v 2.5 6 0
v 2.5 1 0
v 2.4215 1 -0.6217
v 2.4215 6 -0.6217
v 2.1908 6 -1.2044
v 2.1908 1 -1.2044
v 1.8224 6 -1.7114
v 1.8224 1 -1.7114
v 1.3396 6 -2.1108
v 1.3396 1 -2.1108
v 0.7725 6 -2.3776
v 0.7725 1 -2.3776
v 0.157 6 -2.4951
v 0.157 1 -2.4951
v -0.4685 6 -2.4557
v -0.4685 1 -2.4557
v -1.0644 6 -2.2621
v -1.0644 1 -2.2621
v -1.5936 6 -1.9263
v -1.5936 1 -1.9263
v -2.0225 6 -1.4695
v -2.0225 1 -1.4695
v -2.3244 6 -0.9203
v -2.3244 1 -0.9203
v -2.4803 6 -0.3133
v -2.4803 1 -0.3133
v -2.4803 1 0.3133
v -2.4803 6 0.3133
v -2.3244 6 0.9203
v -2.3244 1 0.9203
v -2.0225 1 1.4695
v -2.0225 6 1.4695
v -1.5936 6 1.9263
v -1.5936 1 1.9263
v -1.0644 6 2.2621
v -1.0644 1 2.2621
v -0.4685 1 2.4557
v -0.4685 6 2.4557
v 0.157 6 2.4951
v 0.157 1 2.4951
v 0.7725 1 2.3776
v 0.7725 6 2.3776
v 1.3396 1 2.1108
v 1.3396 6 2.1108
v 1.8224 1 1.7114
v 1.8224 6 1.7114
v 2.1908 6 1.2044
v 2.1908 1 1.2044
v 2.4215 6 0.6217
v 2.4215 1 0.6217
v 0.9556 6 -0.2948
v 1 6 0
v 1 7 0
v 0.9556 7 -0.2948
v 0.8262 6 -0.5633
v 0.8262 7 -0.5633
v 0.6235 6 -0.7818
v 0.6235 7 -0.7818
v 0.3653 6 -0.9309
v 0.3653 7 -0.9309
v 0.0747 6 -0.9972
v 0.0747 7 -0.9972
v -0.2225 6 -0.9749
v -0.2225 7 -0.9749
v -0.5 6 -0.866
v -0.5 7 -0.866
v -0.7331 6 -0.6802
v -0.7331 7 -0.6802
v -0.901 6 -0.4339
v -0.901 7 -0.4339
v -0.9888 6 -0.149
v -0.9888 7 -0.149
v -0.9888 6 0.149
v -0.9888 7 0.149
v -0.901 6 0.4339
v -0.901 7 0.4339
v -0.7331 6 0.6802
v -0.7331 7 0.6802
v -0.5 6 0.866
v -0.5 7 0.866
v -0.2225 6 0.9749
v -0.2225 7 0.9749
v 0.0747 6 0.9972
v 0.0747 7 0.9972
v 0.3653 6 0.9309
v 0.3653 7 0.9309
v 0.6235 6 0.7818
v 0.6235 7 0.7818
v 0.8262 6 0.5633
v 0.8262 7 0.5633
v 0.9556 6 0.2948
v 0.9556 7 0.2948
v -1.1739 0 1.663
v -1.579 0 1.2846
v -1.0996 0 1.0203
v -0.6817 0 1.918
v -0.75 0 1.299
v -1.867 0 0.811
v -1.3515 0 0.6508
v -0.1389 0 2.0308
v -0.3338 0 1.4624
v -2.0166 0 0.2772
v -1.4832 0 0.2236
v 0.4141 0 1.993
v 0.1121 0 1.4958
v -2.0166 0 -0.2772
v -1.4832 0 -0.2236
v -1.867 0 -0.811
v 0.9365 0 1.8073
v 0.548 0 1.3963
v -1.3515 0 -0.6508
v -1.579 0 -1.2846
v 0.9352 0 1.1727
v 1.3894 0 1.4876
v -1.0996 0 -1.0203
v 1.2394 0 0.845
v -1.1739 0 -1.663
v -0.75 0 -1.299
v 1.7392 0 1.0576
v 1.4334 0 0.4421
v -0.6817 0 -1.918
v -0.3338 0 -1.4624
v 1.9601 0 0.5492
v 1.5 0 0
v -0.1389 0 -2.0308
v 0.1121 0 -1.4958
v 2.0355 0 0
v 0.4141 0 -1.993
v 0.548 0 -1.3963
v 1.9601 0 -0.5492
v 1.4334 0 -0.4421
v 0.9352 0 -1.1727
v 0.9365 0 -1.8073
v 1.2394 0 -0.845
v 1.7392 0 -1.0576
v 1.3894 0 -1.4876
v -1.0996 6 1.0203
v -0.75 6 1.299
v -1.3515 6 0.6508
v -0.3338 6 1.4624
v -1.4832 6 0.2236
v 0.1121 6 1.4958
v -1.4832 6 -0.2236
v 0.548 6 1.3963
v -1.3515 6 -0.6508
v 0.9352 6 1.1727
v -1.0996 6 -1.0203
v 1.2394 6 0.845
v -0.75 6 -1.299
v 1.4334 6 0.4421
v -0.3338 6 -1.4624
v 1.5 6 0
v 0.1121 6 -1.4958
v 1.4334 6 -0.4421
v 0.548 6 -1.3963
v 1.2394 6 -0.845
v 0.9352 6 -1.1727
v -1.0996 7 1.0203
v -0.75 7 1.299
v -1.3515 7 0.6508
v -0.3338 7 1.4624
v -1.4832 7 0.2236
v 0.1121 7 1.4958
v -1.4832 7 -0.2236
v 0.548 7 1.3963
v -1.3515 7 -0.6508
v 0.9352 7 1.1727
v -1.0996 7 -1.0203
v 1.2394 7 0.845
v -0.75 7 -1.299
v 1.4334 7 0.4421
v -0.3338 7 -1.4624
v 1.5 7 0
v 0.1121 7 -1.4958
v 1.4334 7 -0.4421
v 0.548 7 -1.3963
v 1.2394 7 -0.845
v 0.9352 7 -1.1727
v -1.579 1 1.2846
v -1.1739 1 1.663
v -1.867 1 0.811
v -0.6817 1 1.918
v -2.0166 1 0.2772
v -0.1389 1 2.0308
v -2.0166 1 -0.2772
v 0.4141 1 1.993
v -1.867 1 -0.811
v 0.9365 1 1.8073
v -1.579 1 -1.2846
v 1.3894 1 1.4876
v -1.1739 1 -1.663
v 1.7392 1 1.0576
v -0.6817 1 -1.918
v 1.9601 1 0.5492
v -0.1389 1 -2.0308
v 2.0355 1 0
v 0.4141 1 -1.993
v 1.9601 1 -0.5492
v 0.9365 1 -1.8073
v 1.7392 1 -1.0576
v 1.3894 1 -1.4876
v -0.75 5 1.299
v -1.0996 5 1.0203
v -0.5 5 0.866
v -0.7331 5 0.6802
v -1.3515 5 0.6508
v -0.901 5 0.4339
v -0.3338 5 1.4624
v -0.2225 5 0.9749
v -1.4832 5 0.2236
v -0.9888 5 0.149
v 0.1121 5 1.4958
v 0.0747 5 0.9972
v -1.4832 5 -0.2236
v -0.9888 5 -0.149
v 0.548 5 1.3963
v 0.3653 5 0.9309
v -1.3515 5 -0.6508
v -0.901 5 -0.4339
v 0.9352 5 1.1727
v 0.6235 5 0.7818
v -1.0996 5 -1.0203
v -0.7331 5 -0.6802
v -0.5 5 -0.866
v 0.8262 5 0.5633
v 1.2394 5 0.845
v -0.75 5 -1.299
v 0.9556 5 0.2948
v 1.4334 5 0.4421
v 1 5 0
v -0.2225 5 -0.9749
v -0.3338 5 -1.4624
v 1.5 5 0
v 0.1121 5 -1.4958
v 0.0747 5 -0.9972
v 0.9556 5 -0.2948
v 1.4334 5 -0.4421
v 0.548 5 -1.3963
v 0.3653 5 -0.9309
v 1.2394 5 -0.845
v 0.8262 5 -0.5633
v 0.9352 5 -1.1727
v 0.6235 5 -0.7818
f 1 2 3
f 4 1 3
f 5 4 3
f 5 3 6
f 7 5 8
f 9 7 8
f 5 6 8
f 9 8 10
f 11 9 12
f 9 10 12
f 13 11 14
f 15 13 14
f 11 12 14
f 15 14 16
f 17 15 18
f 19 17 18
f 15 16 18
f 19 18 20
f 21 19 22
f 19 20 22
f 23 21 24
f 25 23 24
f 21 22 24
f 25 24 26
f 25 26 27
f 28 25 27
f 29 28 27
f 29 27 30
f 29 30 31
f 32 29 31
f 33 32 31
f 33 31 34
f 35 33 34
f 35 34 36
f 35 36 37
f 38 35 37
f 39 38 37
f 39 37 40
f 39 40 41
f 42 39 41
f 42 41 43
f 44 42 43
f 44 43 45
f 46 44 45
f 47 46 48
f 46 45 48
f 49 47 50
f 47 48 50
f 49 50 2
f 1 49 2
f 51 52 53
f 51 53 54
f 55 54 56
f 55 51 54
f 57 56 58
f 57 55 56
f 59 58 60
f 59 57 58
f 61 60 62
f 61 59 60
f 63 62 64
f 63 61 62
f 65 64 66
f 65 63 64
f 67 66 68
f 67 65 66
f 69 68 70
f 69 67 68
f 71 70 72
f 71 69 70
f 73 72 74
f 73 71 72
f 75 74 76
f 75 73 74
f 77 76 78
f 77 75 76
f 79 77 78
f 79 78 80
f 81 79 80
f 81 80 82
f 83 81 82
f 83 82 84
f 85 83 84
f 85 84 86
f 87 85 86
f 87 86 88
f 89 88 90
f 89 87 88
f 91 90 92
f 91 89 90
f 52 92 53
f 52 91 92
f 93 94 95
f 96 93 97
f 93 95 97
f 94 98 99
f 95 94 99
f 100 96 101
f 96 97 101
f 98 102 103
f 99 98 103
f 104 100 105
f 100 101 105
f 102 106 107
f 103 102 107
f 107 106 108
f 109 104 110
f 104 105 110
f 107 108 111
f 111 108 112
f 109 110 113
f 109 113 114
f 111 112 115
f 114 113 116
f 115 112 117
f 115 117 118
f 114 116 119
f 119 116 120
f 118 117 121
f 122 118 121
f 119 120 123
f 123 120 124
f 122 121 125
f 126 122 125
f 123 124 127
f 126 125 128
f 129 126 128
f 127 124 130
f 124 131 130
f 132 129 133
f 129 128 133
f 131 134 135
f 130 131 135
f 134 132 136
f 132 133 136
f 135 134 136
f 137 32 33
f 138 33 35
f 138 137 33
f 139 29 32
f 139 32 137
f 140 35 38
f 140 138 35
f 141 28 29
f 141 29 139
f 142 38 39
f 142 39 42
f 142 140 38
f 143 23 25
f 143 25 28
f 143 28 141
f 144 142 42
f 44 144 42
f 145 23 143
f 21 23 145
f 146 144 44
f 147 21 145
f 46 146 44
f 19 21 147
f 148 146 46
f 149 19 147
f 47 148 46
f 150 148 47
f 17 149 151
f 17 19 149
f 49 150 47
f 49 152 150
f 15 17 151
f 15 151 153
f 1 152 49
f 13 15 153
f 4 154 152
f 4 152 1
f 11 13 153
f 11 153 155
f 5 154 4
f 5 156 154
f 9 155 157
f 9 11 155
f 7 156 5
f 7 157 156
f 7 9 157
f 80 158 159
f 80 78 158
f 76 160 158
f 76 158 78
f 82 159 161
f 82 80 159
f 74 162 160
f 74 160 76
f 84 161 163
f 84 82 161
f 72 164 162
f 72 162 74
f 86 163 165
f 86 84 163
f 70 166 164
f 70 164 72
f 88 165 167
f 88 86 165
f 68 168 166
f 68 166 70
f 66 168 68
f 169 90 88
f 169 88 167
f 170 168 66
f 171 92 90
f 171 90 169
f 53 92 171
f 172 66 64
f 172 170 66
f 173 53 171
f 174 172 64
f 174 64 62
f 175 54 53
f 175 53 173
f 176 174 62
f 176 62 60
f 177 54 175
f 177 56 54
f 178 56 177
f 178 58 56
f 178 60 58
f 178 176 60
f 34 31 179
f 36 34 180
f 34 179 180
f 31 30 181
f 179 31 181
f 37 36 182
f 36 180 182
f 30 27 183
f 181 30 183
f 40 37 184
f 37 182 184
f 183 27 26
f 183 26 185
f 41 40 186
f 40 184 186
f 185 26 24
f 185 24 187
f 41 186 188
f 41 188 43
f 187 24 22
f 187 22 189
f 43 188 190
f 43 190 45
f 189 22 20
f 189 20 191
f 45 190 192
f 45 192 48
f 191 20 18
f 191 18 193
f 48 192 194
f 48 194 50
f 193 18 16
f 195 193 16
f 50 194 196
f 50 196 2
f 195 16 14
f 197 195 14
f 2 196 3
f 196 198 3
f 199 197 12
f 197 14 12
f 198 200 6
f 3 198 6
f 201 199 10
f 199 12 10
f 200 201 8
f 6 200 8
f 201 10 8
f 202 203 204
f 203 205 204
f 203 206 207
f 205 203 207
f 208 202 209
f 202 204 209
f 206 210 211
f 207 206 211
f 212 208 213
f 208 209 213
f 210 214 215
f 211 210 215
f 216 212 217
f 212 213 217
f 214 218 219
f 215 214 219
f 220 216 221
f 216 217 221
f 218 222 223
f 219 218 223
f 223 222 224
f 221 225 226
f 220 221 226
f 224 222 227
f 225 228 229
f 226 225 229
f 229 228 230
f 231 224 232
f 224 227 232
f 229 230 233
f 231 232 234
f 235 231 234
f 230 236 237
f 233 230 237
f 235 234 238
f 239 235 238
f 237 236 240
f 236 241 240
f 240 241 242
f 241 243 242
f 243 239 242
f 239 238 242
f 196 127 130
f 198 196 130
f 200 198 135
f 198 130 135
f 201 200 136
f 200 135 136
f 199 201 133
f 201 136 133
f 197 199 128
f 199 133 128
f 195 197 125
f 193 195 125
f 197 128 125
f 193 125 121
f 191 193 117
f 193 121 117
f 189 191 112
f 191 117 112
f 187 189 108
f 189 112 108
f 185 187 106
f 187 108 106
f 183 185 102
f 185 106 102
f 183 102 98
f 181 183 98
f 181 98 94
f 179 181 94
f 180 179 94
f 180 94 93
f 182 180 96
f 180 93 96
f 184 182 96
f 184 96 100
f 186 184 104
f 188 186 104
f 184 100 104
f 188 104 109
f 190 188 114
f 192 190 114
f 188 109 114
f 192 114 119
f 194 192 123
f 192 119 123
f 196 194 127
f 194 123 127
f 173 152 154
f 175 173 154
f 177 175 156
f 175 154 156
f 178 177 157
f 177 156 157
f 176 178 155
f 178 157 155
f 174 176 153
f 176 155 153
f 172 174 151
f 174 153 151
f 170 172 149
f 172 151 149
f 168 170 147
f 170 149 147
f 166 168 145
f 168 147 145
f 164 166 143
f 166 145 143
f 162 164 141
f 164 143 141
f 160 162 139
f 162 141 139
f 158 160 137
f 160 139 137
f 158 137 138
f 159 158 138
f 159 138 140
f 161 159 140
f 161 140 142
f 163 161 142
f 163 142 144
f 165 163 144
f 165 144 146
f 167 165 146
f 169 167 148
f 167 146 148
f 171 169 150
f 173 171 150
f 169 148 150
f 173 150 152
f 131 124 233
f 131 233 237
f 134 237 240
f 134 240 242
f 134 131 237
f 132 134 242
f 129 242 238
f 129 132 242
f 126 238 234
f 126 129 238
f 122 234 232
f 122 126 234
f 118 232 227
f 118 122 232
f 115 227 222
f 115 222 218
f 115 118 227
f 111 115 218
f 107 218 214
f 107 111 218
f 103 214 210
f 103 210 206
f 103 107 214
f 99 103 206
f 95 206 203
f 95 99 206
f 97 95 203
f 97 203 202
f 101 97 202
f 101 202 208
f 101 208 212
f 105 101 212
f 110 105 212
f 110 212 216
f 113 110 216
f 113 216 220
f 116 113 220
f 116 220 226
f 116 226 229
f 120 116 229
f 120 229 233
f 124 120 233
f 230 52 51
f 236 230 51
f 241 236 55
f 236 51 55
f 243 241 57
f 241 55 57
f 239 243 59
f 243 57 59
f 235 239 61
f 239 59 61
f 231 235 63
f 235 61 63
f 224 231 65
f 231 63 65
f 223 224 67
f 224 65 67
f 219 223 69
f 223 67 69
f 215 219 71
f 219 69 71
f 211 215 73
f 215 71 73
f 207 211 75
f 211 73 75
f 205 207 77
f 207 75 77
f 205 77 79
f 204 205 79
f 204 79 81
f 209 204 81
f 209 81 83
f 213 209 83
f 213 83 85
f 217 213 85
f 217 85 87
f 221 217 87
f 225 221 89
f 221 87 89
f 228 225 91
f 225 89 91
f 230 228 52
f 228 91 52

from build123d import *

# Parameters (mm, degrees)
SKETCH1_R                = 2.5
SKETCH1_R_2              = 1.5
BOSS_EXTRUDE1_DEPTH      = 6
SKETCH1_3_R              = 2.5
SKETCH1_3_R_2            = 2.035533906
CUT_EXTRUDE1_DEPTH       = 1
BOSS_EXTRUDE3_DEPTH      = 1
BOSS_EXTRUDE3_DEPTH_BACK = 1
SKETCH2_R                = 1.5
SKETCH2_R_2              = 1


with BuildPart() as part:
    # Sketch1 → Boss-Extrude1 (new body)
    with BuildSketch(Plane(origin=(0, 0, 0), x_dir=(1, 0, 0), z_dir=(0, 1, 0))):
        Circle(SKETCH1_R)
        Circle(SKETCH1_R_2, mode=Mode.SUBTRACT)
    extrude(amount=BOSS_EXTRUDE1_DEPTH)

    # Sketch1<3> → Cut-Extrude1 (cut)
    with BuildSketch(Plane(origin=(0, 0, 0), x_dir=(1, 0, 0), z_dir=(0, 1, 0))):
        Circle(SKETCH1_3_R)
        Circle(SKETCH1_3_R_2, mode=Mode.SUBTRACT)
    extrude(amount=CUT_EXTRUDE1_DEPTH, mode=Mode.SUBTRACT)

    # Sketch2 → Boss-Extrude3 (add, two sides: drawn at the far end of the back side and taken through both)
    with BuildSketch(Plane(origin=(0, 6, 0), x_dir=(1, 0, 0), z_dir=(0, 1, 0)).offset(-BOSS_EXTRUDE3_DEPTH_BACK)):
        Circle(SKETCH2_R)
        Circle(SKETCH2_R_2, mode=Mode.SUBTRACT)
    extrude(amount=BOSS_EXTRUDE3_DEPTH + BOSS_EXTRUDE3_DEPTH_BACK)


solid = part.part
